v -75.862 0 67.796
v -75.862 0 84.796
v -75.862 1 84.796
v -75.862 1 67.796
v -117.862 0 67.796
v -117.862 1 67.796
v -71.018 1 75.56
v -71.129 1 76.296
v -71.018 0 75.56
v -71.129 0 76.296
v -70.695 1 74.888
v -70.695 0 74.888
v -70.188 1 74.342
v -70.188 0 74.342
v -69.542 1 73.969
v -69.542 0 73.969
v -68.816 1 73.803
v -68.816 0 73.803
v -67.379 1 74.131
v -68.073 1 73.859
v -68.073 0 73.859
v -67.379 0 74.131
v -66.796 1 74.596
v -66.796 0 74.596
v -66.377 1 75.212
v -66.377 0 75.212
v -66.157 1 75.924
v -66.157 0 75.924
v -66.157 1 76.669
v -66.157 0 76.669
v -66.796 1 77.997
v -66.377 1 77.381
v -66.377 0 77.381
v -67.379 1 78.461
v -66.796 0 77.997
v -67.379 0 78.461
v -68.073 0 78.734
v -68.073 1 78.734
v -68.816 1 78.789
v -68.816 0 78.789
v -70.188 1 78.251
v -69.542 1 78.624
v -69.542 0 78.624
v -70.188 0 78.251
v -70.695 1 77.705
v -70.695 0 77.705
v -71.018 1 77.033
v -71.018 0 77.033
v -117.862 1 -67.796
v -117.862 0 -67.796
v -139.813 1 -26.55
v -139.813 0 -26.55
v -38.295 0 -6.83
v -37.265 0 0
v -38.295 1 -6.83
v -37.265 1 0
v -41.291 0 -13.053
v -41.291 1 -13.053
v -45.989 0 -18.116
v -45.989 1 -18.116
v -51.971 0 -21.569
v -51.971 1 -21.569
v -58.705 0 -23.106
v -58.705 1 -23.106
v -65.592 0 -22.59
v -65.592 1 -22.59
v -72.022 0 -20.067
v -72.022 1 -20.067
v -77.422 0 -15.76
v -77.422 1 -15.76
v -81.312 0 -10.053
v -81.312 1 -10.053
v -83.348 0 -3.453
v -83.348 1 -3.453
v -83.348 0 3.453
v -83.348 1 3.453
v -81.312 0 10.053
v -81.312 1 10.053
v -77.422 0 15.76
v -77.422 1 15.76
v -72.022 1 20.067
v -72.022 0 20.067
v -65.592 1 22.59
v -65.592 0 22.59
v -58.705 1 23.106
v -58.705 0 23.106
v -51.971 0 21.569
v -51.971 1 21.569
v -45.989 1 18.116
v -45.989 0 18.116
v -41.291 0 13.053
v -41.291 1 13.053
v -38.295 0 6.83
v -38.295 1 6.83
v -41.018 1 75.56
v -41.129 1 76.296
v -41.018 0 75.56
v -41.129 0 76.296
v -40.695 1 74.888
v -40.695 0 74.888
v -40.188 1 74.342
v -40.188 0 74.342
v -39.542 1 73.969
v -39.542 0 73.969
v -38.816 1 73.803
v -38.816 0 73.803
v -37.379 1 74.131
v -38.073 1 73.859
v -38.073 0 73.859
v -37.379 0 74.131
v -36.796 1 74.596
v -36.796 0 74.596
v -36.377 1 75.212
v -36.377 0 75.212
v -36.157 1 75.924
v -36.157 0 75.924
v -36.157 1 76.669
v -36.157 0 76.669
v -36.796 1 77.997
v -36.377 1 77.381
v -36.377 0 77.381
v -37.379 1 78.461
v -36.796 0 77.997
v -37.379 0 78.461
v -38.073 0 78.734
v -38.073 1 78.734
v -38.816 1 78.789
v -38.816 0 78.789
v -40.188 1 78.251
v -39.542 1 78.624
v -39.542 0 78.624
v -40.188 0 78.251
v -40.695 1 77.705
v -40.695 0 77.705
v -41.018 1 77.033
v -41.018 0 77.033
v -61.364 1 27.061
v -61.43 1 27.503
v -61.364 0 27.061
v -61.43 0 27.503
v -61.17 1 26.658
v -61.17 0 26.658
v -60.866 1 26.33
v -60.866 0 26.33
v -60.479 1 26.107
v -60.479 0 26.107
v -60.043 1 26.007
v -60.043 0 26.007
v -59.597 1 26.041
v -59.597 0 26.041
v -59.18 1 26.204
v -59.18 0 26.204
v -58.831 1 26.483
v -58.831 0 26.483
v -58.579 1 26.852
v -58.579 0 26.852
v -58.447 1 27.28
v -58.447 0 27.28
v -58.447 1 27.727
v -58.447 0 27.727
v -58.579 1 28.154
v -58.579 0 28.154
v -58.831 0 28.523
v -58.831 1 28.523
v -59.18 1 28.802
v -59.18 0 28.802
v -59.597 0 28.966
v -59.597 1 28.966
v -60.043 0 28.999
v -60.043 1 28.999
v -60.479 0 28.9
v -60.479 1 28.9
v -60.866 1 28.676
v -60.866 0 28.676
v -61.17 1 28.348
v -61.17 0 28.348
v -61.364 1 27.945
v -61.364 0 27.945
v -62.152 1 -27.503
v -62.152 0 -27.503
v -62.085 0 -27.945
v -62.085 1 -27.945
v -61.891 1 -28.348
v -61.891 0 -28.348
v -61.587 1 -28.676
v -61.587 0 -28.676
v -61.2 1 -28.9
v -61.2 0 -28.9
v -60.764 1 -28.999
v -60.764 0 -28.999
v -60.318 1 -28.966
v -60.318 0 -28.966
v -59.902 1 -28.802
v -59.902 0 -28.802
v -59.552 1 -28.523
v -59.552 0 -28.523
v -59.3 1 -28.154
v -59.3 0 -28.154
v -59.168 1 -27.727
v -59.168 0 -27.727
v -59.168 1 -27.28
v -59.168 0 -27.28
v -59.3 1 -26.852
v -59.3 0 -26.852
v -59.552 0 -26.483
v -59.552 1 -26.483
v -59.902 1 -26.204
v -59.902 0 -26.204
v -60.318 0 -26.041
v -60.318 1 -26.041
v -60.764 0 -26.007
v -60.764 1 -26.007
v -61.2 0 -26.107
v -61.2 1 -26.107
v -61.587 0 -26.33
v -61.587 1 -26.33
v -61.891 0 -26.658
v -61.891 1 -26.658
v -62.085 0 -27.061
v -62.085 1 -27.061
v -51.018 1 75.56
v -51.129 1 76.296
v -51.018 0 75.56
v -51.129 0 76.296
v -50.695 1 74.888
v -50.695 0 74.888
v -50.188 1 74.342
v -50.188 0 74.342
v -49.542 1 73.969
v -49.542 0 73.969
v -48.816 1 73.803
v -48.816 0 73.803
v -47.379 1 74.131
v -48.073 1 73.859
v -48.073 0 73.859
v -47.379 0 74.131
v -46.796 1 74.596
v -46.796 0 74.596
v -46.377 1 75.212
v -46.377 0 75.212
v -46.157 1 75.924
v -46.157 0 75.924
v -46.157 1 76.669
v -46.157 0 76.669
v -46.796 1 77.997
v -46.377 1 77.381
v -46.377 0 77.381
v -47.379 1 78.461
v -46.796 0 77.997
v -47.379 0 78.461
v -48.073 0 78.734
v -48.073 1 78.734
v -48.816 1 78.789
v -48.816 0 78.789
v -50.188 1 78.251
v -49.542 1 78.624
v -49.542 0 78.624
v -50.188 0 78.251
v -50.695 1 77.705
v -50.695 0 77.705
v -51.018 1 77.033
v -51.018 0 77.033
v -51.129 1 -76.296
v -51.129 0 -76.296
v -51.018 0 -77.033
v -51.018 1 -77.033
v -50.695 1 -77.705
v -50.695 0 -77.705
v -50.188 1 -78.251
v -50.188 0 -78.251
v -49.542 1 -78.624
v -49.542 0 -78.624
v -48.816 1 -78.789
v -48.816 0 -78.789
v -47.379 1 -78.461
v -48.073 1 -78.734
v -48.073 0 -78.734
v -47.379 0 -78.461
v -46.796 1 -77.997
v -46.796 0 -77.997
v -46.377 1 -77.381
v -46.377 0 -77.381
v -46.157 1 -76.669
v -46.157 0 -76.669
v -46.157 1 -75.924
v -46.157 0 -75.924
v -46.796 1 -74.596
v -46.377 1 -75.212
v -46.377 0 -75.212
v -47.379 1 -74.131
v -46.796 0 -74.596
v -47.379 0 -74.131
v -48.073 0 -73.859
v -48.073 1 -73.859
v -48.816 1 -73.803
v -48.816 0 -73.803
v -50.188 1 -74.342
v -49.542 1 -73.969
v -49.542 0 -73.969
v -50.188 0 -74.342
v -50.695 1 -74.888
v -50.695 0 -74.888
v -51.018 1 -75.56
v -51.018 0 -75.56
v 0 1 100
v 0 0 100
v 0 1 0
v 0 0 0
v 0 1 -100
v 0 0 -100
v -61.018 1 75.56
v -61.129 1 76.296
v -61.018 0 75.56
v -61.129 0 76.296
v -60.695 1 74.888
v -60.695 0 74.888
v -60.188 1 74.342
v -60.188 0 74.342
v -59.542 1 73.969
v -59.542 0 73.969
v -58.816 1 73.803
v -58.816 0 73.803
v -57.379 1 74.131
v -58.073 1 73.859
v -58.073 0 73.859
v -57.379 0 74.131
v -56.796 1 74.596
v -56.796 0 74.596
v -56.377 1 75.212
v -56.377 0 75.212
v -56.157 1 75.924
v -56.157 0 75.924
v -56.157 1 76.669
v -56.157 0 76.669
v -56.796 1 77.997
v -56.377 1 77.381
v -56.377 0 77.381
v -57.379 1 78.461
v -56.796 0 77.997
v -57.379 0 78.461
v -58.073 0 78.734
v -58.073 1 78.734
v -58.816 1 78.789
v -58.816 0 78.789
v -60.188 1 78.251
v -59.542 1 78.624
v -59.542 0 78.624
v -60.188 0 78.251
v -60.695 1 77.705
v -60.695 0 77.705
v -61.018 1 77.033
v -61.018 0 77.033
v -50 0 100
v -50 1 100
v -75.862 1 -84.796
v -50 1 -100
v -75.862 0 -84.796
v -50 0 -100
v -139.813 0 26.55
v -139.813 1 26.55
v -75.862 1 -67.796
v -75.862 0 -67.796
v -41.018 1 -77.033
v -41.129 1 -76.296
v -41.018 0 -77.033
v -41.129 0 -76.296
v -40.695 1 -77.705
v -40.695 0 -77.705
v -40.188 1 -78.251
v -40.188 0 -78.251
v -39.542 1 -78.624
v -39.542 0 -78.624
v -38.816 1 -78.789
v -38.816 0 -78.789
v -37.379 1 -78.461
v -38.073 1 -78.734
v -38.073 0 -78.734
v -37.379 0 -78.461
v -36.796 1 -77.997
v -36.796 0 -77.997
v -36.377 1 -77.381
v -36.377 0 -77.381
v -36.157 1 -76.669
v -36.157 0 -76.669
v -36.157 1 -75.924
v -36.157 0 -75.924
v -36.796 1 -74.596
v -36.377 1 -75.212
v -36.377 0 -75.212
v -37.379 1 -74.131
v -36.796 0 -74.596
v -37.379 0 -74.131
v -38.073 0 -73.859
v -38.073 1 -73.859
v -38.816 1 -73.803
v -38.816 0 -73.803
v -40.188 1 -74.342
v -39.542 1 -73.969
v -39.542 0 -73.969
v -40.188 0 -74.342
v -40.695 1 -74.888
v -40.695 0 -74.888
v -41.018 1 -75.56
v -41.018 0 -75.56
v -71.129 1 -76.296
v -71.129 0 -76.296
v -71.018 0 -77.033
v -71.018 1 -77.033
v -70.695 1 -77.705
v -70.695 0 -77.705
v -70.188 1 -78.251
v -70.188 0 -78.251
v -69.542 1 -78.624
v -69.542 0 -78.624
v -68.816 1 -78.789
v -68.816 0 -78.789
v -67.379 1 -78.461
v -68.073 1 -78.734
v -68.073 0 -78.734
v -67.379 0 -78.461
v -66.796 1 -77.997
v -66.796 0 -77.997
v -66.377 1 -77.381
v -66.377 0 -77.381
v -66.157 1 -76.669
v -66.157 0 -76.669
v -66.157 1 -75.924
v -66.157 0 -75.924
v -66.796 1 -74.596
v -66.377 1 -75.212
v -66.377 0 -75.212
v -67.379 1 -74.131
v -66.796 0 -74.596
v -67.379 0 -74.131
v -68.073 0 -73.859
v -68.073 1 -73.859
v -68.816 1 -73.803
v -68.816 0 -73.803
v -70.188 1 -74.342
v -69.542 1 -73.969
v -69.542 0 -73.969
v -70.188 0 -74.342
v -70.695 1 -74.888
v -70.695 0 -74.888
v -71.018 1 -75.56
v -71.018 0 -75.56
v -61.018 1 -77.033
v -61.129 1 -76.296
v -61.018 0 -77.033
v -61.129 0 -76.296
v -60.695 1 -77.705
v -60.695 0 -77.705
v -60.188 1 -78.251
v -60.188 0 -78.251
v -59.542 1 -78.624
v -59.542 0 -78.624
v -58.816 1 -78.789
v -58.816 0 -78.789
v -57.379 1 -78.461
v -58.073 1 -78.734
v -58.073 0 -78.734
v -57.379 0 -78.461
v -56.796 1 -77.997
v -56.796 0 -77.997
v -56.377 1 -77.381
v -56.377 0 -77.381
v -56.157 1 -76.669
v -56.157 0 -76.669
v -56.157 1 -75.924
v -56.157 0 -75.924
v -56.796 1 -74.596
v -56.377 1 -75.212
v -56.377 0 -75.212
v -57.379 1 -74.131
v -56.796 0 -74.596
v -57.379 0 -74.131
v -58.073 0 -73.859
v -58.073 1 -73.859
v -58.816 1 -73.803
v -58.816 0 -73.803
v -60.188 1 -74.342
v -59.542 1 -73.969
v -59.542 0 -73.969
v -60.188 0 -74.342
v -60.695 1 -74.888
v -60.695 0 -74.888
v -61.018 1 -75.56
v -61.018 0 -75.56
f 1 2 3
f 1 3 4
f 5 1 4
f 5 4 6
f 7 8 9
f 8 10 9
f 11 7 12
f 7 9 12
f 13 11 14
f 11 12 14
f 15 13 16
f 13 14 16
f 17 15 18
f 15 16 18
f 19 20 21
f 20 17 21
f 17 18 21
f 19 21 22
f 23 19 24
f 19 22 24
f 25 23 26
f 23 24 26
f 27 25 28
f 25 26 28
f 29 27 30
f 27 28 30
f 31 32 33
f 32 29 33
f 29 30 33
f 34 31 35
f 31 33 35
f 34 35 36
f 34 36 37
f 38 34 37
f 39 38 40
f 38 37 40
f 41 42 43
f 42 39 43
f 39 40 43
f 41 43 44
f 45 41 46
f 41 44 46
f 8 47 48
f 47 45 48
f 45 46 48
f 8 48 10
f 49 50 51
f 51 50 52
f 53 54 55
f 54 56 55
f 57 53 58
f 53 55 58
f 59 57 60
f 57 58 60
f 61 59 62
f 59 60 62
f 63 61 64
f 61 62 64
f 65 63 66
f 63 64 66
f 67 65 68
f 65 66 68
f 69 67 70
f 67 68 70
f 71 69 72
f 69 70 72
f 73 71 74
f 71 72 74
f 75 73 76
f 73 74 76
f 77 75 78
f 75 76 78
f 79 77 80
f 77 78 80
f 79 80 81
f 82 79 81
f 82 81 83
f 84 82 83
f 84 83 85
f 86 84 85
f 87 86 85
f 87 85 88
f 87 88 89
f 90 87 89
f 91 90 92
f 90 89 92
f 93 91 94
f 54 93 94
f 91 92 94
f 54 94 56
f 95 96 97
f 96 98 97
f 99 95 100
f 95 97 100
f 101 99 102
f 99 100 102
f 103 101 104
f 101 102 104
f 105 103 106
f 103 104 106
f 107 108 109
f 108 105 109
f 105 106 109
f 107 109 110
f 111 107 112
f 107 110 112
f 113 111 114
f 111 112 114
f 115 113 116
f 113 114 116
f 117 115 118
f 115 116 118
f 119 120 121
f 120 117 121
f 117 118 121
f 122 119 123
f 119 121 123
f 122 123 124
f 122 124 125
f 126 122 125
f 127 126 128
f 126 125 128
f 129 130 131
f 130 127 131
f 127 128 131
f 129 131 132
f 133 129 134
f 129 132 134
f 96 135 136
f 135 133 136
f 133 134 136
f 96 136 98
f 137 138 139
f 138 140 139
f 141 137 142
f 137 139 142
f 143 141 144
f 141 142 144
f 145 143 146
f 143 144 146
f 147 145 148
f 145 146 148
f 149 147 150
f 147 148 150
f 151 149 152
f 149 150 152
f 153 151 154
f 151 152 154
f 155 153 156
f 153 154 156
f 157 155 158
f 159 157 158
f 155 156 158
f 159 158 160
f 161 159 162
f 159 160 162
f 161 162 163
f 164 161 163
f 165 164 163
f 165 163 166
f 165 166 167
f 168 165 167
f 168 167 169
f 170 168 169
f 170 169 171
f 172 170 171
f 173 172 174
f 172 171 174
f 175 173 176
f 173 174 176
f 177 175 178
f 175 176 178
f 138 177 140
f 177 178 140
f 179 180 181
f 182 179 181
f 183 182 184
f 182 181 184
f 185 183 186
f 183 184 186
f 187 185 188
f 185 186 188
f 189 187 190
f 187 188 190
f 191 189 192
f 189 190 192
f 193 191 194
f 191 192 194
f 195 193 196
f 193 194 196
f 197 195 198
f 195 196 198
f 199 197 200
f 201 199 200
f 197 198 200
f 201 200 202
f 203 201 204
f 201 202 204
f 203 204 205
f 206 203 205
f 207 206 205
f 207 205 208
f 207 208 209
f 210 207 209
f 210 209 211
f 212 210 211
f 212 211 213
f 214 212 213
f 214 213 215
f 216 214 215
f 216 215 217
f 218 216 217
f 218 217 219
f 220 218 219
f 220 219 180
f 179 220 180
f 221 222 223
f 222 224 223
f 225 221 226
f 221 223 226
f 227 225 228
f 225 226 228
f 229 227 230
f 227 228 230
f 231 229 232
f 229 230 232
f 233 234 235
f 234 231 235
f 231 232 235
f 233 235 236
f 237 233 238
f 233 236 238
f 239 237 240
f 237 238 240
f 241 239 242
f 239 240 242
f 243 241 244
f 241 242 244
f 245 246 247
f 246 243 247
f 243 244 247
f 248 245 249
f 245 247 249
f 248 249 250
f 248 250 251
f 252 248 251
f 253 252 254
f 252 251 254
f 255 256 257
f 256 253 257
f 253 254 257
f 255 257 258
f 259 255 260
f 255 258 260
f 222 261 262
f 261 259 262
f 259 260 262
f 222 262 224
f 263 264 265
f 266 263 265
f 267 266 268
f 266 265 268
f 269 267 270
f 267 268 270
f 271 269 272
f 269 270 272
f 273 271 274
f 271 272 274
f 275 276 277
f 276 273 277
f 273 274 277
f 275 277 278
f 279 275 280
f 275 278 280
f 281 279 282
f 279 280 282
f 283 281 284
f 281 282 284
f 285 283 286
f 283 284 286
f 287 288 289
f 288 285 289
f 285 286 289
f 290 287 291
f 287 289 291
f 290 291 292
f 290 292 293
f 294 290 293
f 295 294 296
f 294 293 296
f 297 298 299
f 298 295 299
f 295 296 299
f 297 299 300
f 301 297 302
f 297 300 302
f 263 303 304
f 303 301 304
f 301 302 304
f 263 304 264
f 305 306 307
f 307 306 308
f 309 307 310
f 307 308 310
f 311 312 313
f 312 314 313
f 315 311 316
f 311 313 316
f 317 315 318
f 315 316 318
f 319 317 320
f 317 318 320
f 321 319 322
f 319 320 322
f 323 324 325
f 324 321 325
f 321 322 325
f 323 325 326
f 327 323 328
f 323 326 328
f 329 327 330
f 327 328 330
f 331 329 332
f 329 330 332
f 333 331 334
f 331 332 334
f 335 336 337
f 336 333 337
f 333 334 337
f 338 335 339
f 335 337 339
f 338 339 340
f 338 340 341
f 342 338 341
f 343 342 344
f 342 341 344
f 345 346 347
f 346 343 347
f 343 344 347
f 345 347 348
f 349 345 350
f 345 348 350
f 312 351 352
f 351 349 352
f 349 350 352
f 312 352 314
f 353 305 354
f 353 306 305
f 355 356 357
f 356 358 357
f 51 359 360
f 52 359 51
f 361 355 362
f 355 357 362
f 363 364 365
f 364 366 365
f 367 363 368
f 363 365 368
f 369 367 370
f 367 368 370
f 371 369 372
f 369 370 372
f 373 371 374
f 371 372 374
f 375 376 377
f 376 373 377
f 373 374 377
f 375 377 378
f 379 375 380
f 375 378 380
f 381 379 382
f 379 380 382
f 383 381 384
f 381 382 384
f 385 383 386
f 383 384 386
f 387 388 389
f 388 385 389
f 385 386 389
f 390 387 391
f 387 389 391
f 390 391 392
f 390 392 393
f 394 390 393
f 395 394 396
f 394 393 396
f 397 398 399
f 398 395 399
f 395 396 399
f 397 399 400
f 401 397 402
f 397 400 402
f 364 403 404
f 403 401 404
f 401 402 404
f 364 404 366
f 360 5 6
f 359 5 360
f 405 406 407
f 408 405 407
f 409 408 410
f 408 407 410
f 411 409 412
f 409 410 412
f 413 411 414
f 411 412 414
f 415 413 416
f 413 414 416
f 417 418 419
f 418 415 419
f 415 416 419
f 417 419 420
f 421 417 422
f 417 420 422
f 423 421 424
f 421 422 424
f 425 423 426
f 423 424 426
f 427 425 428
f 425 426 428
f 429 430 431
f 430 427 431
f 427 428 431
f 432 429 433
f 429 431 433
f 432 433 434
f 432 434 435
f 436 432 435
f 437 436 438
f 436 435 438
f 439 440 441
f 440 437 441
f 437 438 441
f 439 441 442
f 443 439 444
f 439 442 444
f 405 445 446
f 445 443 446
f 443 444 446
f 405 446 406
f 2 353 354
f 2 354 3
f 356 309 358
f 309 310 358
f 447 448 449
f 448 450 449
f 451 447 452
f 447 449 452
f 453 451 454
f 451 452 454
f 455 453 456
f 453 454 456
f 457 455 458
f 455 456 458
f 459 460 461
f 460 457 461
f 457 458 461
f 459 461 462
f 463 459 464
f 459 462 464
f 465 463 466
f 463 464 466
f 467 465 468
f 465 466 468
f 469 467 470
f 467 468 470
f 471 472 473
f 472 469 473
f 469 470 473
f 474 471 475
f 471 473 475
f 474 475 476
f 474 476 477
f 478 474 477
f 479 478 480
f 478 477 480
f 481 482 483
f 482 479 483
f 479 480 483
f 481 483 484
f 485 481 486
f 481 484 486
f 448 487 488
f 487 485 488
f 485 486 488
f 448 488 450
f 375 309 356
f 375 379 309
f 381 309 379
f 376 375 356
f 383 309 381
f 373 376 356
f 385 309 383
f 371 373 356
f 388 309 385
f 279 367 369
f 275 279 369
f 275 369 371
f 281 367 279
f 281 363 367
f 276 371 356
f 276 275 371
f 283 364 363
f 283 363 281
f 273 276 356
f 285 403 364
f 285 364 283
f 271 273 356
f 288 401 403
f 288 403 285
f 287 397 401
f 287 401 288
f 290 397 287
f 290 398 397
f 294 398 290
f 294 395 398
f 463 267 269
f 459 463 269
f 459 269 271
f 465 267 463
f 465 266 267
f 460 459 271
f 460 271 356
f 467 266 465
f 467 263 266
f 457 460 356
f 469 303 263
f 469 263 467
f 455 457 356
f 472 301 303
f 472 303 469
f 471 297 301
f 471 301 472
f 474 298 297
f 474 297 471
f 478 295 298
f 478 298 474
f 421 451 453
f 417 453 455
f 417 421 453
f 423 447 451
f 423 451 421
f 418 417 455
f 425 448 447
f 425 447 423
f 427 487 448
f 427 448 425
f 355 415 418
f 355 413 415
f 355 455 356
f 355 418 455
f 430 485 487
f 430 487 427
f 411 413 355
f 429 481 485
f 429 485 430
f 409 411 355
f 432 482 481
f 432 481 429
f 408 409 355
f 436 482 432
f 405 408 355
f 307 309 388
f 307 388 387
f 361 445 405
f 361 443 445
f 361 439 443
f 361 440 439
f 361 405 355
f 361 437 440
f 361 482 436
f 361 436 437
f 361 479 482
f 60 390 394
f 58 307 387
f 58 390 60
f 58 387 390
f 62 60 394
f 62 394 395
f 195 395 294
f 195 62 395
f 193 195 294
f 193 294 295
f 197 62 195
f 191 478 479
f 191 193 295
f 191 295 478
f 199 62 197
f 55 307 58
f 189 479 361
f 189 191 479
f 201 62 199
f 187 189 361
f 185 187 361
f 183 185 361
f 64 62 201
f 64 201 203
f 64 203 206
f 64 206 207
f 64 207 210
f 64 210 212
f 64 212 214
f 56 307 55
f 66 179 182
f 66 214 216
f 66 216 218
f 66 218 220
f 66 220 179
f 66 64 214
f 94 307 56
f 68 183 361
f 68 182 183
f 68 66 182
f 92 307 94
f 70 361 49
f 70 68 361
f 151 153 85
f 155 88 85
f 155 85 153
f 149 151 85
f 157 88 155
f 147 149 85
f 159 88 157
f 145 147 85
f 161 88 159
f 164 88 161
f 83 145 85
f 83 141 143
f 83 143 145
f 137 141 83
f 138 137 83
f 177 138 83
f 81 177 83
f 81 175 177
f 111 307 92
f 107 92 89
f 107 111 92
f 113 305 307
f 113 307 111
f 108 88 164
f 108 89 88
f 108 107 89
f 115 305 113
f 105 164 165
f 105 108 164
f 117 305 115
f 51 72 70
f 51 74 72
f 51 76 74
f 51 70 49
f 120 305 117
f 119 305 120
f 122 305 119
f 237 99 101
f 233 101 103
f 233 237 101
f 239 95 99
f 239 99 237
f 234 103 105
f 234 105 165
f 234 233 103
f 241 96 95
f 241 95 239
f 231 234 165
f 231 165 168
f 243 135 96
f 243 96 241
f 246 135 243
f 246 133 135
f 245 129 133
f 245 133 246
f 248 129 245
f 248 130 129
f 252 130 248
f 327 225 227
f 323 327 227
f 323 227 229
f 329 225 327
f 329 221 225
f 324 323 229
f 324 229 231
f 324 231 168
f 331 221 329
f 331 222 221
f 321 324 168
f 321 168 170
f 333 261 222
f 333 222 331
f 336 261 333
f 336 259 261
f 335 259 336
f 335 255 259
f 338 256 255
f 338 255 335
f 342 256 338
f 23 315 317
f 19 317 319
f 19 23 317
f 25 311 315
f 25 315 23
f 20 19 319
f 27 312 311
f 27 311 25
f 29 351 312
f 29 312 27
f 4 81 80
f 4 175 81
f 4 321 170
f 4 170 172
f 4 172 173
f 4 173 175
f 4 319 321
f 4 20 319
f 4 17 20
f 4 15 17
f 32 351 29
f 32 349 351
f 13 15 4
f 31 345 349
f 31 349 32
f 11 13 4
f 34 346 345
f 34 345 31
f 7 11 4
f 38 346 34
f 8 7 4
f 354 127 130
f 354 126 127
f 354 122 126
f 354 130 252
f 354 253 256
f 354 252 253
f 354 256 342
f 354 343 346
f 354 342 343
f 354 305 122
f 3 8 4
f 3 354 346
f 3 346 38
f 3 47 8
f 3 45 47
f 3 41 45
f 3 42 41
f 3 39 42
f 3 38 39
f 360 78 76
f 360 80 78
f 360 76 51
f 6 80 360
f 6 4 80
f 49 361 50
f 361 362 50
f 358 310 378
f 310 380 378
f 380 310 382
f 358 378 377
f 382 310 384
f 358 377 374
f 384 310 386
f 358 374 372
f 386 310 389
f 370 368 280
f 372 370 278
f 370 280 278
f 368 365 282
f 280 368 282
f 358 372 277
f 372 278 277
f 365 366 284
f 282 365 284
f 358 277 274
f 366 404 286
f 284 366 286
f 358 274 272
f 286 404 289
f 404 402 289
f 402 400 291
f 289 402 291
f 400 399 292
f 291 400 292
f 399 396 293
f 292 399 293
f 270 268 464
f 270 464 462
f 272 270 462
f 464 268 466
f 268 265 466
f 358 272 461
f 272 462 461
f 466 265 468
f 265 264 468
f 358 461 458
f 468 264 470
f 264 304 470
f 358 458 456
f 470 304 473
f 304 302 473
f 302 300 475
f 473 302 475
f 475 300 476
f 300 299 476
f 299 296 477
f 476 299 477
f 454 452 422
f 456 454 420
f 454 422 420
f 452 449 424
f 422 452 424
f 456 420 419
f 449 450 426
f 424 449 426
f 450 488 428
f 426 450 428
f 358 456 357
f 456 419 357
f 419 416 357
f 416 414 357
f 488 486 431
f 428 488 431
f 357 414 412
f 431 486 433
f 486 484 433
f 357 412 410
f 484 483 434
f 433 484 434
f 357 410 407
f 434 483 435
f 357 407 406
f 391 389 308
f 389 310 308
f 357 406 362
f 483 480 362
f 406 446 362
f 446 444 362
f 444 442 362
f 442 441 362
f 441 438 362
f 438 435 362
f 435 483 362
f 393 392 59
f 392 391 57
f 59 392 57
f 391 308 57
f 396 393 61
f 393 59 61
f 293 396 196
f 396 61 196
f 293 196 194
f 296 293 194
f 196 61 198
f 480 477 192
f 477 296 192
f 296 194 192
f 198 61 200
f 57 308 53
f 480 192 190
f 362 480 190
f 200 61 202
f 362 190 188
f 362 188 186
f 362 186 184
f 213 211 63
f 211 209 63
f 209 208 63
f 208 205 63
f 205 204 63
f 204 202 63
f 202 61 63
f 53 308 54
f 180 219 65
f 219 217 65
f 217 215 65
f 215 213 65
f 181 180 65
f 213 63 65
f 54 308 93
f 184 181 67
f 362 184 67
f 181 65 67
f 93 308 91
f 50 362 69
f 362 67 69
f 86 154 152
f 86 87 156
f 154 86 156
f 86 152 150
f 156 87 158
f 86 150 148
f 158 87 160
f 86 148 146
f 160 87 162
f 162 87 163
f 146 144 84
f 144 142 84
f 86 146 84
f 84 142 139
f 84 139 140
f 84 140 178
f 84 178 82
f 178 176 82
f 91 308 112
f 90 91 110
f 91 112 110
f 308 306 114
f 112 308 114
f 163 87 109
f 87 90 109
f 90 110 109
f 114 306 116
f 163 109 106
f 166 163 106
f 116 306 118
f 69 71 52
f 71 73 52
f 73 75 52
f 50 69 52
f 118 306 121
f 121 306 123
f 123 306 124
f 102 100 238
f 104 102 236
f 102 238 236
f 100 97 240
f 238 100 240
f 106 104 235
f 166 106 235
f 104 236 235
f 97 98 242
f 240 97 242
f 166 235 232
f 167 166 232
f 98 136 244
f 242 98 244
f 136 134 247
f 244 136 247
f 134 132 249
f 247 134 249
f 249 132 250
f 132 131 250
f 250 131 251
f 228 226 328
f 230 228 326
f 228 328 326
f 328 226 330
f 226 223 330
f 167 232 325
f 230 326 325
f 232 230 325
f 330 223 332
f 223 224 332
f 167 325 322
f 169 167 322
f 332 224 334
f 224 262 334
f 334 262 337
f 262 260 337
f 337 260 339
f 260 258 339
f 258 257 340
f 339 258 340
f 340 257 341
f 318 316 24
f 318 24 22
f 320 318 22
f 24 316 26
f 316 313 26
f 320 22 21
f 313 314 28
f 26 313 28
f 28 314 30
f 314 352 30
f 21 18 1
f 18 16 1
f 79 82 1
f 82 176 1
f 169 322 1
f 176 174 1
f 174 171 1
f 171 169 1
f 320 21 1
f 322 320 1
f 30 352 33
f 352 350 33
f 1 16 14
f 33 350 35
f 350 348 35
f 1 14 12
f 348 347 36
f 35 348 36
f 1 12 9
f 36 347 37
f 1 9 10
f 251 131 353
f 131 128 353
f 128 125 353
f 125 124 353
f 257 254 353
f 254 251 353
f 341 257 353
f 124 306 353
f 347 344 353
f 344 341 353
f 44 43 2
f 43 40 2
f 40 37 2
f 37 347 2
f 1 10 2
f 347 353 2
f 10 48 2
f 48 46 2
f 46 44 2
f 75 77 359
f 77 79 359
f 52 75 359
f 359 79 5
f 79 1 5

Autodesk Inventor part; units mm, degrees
ref_plane "YZ Plane" through (0, 0, 0) normal (1, 0, 0) x (0, 1, 0)
ref_plane "XZ Plane" through (0, 0, 0) normal (0, 1, 0) x (-1, 0, 0)
ref_plane "XY Plane" through (0, 0, 0) normal (0, 0, 1) x (1, 0, 0)
sketch "Esboço1" plane through (0, 0, 0) normal (0, 1, 0) x (-1, 0, 0)
  line L0 (0, 100) -> (50, 100)
  line L1 (50, 100) -> (75.8622, 84.7964)
  line L2 (50, 100) -> (80, 100) construction
  line L3 (75.8622, 84.7964) -> (75.8622, 67.7964)
  line L4 (75.8622, 67.7964) -> (117.8622, 67.7964)
  line L5 (117.8622, 67.7964) -> (170.8622, 67.7964) construction
  circle A0 centre (68.629, 76.2964) radius 2.5
  circle A1 centre (58.629, 76.2964) radius 2.5
  circle A2 centre (48.629, 76.2964) radius 2.5
  circle A3 centre (38.629, 76.2964) radius 2.5
  line L6 (0, -100) -> (50, -100)
  line L7 (50, -100) -> (75.8622, -84.7964)
  line L8 (75.8622, -84.7964) -> (75.8622, -67.7964)
  line L9 (75.8622, -67.7964) -> (117.8622, -67.7964)
  circle A4 centre (68.629, -76.2964) radius 2.5
  circle A5 centre (58.629, -76.2964) radius 2.5
  circle A6 centre (48.629, -76.2964) radius 2.5
  circle A7 centre (38.629, -76.2964) radius 2.5
  line L10 (0, 100) -> (0, -100)
  line L11 (75.8622, -82.1665) -> (75.8622, -70.1665)
  circle A8 centre (61.129, 0) radius 23
  line L12 (117.8622, 67.7964) -> (139.8134, 26.55)
  line L13 (117.8622, -67.7964) -> (139.8134, -26.55)
  line L14 (139.8134, 26.55) -> (139.8134, -26.55)
  line L15 (0, 0) -> (61.129, 0)
  circle A9 centre (59.9305, 27.5032) radius 1.5
  circle A10 centre (60.6516, -27.5032) radius 1.5
  dimension "d5" = 30
  dimension "d6" = 30.45
  dimension "d17" = 10
  dimension "d32" = 42
  dimension "d33" = 25.8621
  dimension "d34" = 50
  dimension "d37" = 46
  dimension "d40" = 53.1001
  dimension "d41" = 21.9513
  dimension "d42" = 17
  dimension "d43" = 46.7239
  dimension "d44" = 118.022
  dimension "d45" = 61.129
  dimension "d46" = 200
  dimension "d48" = 3
  dimension "d53" = 3
extrude "Extrusão1" add sketch "Esboço1" along normal blind 1 contours A8 | L0 L1 L3 L4 L12 L14 L13 L9 L8 L7 L6 L10 | A9 | A10
sketch "Esboço3" plane through (0, 1, 0) normal (0, 1, 0) x (1, 0, 0)
  circle A0 centre (-60.4361, 0) radius 23.1709
  point P0 (0, 0)
extrude "Extrusão3" cut sketch "Esboço3" against normal blind 3.75
extrude "Extrusão4" cut sketch "Esboço1" along normal blind 3.75 contours A9
extrude "Extrusão5" [suppressed]
extrude "Extrusão6" cut sketch "Esboço1" along normal blind 3.75 contours A10
sketch "Esboço4" plane through (0, 1, 0) normal (0, 1, 0) x (1, 0, 0)
  point P0 (0, 0)
